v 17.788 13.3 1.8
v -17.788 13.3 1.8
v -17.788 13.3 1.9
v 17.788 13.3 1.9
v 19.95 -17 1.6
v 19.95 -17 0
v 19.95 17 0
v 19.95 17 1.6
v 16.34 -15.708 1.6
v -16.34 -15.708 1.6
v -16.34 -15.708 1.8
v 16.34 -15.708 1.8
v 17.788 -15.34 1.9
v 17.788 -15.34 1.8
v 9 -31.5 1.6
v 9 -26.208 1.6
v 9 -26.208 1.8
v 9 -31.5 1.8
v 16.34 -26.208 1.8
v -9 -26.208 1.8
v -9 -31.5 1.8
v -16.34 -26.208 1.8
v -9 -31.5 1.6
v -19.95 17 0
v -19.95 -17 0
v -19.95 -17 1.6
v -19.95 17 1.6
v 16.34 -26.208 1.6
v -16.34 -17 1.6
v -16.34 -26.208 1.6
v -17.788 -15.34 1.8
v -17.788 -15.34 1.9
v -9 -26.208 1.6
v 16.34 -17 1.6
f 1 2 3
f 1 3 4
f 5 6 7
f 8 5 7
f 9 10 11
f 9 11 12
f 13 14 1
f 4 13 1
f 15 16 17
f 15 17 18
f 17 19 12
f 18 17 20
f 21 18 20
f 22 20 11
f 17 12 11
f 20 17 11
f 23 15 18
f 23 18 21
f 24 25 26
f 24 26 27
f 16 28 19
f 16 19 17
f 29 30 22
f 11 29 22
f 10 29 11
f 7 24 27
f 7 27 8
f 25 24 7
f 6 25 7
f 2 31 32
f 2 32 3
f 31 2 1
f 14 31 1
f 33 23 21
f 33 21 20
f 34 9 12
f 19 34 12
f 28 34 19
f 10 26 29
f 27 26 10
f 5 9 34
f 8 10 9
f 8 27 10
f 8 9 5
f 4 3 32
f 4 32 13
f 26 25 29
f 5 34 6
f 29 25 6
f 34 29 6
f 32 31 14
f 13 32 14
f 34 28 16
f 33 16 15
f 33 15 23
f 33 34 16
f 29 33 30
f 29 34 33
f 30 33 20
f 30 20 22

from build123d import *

# Parameters (mm, degrees)
SKETCH_1_W      = 39.9
SKETCH_1_H      = 34
EXTRUDE_1_DEPTH = 1.6
EXTRUDE_2_DEPTH = 0.2
SKETCH_3_W      = 35.575
SKETCH_3_H      = 28.64
EXTRUDE_3_DEPTH = 0.1


with BuildPart() as part:
    # 草图1 → 凸台-拉伸1 (new body)
    with BuildSketch(Plane.XY):
        Rectangle(SKETCH_1_W, SKETCH_1_H)
    extrude(amount=EXTRUDE_1_DEPTH)

    # 草图2 → 凸台-拉伸2 (add)
    with BuildSketch(Plane.XY.offset(1.6)):
        Polygon((-16.34, -15.707906265), (16.34, -15.707906265), (16.34, -26.207906265), (9, -26.207906265), (9, -31.5), (-9, -31.5), (-9, -26.207906265), (-16.34, -26.207906265), align=None)
    extrude(amount=EXTRUDE_2_DEPTH)


with BuildPart() as body_2:
    # 草图3 → 凸台-拉伸3 (new body)
    with BuildSketch(Plane.XY.offset(1.8)):
        with Locations((0, -1.02)):
            Rectangle(SKETCH_3_W, SKETCH_3_H)
    extrude(amount=EXTRUDE_3_DEPTH)


solid = Compound([part.part, body_2.part])
